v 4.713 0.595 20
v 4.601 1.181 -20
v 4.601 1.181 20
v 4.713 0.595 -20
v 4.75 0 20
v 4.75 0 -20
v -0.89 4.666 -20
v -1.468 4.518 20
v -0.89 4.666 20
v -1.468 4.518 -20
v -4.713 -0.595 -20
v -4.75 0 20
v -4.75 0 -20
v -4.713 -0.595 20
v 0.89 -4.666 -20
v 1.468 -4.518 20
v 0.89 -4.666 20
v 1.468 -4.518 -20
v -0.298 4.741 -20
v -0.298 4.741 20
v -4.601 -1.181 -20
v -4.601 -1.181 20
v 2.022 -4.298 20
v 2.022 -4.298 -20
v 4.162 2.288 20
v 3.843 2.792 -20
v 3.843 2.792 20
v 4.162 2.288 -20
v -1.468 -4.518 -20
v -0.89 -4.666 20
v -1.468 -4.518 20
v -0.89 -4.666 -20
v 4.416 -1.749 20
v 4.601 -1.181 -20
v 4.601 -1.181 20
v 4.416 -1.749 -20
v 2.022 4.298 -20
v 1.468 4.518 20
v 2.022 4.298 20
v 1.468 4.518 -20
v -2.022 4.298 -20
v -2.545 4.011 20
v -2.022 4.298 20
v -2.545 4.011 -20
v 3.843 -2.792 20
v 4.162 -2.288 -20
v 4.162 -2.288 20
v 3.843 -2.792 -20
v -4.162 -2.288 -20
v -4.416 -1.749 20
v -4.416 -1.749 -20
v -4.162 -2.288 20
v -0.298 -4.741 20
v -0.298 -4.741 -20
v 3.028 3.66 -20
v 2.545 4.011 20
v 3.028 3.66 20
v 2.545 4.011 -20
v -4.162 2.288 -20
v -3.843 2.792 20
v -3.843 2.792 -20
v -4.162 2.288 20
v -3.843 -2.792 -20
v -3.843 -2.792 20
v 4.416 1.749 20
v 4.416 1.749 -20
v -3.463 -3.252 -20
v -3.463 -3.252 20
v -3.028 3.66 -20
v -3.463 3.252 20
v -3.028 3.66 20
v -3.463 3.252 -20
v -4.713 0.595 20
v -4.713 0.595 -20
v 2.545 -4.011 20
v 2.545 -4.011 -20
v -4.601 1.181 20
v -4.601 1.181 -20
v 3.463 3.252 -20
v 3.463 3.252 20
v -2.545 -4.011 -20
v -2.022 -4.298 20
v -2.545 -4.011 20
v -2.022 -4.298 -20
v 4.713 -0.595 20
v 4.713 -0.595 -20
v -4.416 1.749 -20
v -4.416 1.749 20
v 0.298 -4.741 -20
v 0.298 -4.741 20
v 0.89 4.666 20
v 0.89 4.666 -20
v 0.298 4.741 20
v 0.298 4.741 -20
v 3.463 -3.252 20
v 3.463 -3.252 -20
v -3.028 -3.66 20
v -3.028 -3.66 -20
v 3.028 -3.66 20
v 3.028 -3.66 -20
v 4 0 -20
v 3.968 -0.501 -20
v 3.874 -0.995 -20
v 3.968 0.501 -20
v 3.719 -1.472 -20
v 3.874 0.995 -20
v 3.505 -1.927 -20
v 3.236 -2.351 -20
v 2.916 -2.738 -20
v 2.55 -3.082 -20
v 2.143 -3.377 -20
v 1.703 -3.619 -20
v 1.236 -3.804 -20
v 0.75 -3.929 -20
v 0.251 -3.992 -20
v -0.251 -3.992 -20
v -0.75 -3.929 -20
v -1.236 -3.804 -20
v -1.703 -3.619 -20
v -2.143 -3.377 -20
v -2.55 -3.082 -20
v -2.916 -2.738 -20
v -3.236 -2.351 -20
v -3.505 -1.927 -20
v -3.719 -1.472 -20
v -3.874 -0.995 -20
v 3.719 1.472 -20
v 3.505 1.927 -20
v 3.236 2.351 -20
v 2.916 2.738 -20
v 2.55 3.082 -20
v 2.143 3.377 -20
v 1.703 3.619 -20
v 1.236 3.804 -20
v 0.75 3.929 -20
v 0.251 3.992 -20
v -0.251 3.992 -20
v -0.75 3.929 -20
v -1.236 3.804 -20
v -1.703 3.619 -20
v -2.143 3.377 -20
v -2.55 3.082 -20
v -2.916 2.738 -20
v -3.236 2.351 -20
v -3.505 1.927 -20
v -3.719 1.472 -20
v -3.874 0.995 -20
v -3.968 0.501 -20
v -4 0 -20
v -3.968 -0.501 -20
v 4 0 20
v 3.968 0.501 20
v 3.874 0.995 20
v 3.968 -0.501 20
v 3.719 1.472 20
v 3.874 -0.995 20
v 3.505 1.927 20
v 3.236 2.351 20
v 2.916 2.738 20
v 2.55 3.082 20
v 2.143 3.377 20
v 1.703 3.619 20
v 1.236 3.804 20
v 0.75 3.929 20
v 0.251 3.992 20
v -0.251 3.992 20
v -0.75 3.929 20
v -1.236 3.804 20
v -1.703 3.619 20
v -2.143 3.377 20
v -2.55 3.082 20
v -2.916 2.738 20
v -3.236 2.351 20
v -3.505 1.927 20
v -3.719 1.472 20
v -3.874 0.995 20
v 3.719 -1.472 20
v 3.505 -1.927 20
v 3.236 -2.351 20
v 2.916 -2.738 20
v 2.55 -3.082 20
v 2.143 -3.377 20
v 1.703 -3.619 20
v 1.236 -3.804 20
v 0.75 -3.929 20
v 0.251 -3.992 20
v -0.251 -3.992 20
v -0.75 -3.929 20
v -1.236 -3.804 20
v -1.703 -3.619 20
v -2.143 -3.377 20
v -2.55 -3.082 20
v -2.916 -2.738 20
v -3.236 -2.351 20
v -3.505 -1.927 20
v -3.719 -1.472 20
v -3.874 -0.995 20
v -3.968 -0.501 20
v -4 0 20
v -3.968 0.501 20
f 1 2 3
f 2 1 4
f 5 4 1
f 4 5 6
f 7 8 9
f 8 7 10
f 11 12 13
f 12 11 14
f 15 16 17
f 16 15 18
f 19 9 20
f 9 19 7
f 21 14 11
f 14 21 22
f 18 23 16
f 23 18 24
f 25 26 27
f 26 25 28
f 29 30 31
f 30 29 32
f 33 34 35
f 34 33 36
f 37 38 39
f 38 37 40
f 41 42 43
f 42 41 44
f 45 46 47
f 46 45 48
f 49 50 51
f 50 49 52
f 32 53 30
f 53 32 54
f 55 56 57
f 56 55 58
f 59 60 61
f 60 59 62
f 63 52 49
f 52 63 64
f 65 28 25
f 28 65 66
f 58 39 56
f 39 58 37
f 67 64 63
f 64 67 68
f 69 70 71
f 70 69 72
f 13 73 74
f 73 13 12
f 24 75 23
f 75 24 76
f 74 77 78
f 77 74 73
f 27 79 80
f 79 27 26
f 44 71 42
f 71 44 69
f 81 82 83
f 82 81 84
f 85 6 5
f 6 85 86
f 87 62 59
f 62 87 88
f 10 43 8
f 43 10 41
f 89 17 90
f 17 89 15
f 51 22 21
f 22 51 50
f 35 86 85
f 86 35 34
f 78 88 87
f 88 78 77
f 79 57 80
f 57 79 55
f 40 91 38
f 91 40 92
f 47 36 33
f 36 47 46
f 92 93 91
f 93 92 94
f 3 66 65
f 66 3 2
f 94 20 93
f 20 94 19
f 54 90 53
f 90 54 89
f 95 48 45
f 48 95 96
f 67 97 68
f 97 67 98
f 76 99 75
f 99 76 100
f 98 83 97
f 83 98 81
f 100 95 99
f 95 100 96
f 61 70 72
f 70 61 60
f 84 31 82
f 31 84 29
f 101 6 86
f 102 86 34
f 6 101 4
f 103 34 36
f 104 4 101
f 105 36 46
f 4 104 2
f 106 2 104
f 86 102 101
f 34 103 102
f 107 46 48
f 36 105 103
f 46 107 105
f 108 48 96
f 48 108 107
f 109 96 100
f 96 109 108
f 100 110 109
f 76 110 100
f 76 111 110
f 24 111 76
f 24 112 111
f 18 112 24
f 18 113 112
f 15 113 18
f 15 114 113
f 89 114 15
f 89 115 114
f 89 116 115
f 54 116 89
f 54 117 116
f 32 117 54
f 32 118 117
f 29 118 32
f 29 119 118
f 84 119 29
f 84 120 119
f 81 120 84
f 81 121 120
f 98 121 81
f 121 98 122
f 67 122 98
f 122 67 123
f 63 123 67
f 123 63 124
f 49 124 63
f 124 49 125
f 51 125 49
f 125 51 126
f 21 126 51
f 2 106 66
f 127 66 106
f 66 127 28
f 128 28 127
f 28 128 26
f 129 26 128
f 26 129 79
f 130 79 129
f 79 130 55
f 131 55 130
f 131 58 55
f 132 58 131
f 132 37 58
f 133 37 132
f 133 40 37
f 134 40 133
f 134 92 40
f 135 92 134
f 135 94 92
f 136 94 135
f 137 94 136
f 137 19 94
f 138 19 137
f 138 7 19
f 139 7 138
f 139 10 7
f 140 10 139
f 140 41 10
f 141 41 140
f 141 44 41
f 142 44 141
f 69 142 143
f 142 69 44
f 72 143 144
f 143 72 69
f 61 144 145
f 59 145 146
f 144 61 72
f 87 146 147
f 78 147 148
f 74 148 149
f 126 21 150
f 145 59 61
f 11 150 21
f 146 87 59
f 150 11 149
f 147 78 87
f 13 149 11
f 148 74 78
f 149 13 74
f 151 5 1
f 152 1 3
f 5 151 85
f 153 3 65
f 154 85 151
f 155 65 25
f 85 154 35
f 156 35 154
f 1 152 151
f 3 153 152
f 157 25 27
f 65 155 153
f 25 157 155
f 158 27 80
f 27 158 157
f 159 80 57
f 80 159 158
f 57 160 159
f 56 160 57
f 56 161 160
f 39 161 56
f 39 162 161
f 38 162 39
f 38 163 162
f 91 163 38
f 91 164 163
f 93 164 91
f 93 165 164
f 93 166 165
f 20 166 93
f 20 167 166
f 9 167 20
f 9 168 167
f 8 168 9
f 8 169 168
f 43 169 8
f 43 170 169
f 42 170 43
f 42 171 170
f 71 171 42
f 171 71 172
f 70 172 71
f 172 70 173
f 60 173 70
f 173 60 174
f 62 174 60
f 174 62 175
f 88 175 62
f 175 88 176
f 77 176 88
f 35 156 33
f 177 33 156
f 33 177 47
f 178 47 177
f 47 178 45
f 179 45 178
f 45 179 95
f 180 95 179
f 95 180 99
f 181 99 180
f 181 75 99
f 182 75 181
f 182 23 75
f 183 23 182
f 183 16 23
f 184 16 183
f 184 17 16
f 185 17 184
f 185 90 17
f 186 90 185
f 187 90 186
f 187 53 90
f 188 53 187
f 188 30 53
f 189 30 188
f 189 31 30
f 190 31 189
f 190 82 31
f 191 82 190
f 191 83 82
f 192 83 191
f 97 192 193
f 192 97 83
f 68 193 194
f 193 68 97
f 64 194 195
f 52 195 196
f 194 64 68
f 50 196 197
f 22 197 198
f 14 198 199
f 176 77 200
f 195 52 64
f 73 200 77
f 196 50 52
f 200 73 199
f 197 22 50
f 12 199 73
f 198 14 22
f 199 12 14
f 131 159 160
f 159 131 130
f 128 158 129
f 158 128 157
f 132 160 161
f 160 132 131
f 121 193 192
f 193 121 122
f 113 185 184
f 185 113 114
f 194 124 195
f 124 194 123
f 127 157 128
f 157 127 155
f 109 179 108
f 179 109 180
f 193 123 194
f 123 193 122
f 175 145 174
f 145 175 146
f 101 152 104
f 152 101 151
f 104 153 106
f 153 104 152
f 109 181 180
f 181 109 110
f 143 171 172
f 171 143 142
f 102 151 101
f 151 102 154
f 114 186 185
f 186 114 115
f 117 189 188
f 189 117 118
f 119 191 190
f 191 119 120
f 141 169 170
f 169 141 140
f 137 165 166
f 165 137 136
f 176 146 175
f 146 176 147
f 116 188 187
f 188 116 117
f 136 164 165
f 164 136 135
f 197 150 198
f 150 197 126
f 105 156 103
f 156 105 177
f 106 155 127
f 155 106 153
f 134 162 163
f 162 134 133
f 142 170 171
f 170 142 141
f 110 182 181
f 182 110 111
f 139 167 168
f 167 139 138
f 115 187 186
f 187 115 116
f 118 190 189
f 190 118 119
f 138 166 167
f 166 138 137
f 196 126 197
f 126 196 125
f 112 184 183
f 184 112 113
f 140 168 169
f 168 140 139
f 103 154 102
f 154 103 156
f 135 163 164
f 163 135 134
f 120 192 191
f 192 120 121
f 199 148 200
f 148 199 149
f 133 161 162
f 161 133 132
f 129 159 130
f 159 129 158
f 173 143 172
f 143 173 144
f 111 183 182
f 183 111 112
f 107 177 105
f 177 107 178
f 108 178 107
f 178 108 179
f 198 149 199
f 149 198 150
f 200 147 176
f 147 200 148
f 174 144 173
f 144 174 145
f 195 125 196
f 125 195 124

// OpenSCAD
$fn = 50;


difference() {
	union() {
		translate(v = [0, 0, -20.0000000000]) {
			cylinder(h = 40, r = 4.7500000000);
		}
	}
	union() {
		translate(v = [0, 0, -100.0000000000]) {
			cylinder(h = 200, r = 4.0000000000);
		}
	}
}
